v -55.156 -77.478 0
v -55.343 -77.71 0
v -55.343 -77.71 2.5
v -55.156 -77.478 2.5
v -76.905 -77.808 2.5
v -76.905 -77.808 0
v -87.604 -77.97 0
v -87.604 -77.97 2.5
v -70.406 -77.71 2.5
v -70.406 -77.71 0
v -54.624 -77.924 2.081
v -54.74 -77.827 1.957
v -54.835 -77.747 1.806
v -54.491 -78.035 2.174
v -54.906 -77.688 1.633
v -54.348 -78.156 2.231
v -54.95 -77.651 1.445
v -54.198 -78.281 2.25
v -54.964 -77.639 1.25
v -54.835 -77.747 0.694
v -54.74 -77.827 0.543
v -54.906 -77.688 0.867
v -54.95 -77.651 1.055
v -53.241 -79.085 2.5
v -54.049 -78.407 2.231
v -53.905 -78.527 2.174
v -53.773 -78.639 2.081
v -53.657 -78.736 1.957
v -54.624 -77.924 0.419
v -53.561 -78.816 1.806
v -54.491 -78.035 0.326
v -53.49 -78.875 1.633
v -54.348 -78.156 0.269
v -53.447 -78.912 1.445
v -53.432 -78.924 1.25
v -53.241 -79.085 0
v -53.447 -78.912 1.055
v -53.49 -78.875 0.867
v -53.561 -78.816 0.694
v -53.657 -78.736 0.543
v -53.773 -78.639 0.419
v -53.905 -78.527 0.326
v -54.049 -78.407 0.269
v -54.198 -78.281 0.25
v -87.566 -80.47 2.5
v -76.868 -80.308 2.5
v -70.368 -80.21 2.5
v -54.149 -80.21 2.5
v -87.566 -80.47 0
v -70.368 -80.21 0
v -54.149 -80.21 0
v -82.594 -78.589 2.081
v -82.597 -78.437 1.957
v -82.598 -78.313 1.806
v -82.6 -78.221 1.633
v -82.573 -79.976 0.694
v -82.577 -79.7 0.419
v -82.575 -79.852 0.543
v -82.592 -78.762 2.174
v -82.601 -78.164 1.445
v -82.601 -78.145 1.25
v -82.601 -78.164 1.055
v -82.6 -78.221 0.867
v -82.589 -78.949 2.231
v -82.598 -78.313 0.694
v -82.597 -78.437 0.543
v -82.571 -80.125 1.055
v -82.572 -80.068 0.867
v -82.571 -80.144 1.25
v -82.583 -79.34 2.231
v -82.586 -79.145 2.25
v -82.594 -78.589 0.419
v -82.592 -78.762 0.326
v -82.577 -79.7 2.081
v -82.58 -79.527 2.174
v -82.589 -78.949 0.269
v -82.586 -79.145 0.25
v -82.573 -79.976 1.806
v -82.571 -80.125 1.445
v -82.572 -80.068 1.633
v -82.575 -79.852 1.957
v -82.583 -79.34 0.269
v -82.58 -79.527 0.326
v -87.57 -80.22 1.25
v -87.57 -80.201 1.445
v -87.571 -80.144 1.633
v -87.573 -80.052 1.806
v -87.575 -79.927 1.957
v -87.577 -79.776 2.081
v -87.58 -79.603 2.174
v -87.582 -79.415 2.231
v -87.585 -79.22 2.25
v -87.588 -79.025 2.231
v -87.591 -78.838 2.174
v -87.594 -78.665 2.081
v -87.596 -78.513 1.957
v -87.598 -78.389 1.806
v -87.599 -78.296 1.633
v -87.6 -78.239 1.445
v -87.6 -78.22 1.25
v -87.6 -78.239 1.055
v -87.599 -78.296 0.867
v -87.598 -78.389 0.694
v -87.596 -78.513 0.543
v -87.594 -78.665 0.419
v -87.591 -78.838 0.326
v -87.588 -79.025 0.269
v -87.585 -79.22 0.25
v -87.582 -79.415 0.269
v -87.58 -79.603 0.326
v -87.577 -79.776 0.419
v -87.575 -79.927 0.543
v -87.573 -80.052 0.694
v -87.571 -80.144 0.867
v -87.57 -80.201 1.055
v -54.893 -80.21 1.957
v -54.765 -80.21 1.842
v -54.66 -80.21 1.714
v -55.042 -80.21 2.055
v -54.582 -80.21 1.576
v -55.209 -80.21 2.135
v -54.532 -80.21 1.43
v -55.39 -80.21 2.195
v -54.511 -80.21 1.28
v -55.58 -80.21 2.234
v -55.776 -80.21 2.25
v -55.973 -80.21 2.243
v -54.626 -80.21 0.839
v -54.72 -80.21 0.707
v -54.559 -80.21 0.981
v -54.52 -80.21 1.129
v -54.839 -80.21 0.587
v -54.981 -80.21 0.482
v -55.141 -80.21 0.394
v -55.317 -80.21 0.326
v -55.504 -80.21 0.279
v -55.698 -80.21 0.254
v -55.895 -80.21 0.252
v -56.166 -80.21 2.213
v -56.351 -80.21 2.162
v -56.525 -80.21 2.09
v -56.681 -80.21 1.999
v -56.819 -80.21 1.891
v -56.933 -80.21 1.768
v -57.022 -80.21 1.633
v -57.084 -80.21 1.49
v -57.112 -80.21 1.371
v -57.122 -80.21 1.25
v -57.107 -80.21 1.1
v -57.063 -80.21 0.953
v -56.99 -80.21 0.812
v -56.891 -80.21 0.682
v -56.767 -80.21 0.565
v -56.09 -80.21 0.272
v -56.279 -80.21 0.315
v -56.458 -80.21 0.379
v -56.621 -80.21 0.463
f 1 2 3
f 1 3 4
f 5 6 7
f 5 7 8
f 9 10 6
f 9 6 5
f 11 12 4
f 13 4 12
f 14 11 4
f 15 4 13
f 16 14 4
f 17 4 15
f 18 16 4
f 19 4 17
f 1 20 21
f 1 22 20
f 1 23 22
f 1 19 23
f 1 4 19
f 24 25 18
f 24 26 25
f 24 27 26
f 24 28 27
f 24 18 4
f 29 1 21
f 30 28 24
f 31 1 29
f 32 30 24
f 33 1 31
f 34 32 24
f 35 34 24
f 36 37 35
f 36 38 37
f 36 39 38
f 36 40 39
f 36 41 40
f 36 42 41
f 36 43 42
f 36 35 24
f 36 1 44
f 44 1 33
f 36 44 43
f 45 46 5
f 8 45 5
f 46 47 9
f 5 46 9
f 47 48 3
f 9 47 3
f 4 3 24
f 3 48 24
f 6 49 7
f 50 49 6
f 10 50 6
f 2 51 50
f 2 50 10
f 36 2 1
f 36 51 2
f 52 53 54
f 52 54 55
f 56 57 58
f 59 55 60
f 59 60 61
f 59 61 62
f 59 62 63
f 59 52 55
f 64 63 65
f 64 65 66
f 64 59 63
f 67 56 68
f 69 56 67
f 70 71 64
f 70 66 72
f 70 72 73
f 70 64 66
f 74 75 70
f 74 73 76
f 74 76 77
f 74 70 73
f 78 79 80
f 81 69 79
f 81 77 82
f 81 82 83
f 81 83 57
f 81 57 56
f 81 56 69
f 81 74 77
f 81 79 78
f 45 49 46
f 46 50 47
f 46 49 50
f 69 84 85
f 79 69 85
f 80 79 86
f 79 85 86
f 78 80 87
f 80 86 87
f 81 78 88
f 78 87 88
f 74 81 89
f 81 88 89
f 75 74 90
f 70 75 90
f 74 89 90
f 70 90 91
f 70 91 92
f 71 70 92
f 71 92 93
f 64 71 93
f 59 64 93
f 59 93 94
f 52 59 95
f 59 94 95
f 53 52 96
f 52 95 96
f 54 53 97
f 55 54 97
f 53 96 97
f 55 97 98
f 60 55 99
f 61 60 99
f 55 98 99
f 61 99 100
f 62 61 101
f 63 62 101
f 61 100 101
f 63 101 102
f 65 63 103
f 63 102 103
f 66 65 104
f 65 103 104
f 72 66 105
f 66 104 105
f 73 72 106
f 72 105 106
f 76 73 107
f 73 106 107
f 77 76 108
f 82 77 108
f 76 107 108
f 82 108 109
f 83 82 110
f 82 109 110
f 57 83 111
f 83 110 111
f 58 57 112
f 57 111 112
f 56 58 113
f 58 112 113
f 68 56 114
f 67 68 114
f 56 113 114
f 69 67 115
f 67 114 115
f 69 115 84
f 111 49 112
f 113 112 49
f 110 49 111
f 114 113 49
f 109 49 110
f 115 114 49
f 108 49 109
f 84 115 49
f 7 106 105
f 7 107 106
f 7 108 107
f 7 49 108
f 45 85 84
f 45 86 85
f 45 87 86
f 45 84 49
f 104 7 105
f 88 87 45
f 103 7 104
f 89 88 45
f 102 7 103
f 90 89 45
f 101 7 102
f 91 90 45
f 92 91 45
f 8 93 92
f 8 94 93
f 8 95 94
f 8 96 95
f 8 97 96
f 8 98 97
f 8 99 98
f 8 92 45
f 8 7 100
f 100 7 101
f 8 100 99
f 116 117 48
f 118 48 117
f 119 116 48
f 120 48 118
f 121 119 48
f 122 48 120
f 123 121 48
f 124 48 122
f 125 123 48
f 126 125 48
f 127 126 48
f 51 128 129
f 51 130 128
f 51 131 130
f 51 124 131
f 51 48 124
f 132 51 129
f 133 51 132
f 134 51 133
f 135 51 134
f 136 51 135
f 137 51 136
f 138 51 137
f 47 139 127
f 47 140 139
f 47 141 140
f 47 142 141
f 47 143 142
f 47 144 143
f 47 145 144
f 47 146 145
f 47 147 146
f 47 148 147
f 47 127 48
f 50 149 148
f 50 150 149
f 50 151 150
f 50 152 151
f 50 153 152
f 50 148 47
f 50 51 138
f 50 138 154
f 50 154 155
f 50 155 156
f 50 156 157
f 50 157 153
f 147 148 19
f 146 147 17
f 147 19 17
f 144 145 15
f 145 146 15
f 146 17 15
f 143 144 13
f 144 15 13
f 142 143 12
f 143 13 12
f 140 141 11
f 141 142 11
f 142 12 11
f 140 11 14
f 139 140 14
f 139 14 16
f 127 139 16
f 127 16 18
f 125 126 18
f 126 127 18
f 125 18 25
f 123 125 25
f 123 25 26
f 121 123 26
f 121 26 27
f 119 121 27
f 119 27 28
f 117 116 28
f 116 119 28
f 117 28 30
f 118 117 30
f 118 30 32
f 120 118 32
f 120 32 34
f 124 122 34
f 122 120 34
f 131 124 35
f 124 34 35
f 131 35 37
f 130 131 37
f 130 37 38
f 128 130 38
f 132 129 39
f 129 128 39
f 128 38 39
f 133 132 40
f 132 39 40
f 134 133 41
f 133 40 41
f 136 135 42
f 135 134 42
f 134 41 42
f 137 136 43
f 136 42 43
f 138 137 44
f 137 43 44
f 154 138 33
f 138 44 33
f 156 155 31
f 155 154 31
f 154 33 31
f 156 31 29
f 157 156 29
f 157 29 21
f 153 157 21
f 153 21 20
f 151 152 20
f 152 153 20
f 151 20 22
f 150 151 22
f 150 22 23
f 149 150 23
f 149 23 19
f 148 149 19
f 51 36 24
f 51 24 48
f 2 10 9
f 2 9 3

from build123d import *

# Parameters (mm, degrees)
BOSS_EXTRUDE1_DEPTH = 2.5
SKETCH2_R           = 1
CUT_EXTRUDE1_DEPTH  = 4.5
SKETCH3_R           = 1
CUT_EXTRUDE2_DEPTH  = 9.5
SKETCH5_R           = 1
BOSS_EXTRUDE2_DEPTH = 9.5
SKETCH7_W           = 2.5
SKETCH7_H           = 2.48697386
BOSS_EXTRUDE5_DEPTH = 17
SKETCH8_R           = 1
CUT_EXTRUDE3_DEPTH  = 9.5
SKETCH9_W           = 2.5
SKETCH9_H           = 2.510853282
CUT_EXTRUDE4_DEPTH  = 10.5
SKETCH10_R          = 1
CUT_EXTRUDE5_DEPTH  = 4.5
SKETCH11_R          = 1
BOSS_EXTRUDE6_DEPTH = 4.5
SKETCH12_R          = 1
CUT_EXTRUDE6_DEPTH  = 4
SKETCH13_W          = 2.5
SKETCH13_H          = 2.5
CUT_EXTRUDE7_DEPTH  = 6.5
SKETCH14_W          = 2.5
SKETCH14_H          = 2.5
BOSS_EXTRUDE7_DEPTH = 6.5
SKETCH15_R          = 1
CUT_EXTRUDE8_DEPTH  = 5
SKETCH16_R          = 1
BOSS_EXTRUDE8_DEPTH = 5
SKETCH17_W          = 2.5
SKETCH17_H          = 2.5
BOSS_EXTRUDE9_DEPTH = 17
SKETCH18_R          = 1
CUT_EXTRUDE9_DEPTH  = 5
SKETCH19_W          = 2.5
SKETCH19_H          = 2.5
CUT_EXTRUDE10_DEPTH = 6.3
SKETCH20_R          = 1
CUT_EXTRUDE11_DEPTH = 5


with BuildPart() as part:
    # Sketch1 → Boss-Extrude1 (new body)
    with BuildSketch(Plane.XY):
        Polygon((-70.406172668, -77.710060133), (-55.343173361, -77.710060133), (-55.155758053, -77.477979804), (-53.240646945, -79.084948828), (-54.148993857, -80.209773972), (-70.368347793, -80.209773972), align=None)
    extrude(amount=BOSS_EXTRUDE1_DEPTH)

    # Sketch2 → Cut-Extrude1 (cut)
    with BuildSketch(Plane(origin=(-60.939488189, -72.62485398, 0), x_dir=(0, 0, -1), z_dir=(0.6427876096865354, 0.7660444431189815, 0))):
        with Locations(Location((-1.25, -8.800123479, 0), (0, 0, 90))):
            Circle(SKETCH2_R)
    extrude(amount=-CUT_EXTRUDE1_DEPTH, mode=Mode.SUBTRACT)

    # Sketch3 → Cut-Extrude2 (cut)
    with BuildSketch(Plane(origin=(-71.565670343, -1.082908957, 0), x_dir=(0, 0, 1), z_dir=(-0.9998855357578962, -0.015129949839474955, 0))):
        with Locations(Location((1.25, -77.885923249, 0), (0, 0, 270))):
            Circle(SKETCH3_R)
    extrude(amount=-CUT_EXTRUDE2_DEPTH, mode=Mode.SUBTRACT)

    # Sketch5 → Boss-Extrude2 (add)
    with BuildSketch(Plane(origin=(-71.565670343, -1.082908957, 0), x_dir=(0, 0, 1), z_dir=(-0.9998855357578961, -0.015129949839476386, 0))):
        with Locations((1.25, -77.885923249)):
            Circle(SKETCH5_R)
    extrude(amount=-BOSS_EXTRUDE2_DEPTH)

    # Sketch7 → Boss-Extrude5 (add)
    with BuildSketch(Plane(origin=(-71.565670343, -1.082908957, 0), x_dir=(0, 0, 1), z_dir=(-0.9998855357578961, -0.015129949839476386, 0))):
        with Locations((1.25, -77.879410179)):
            Rectangle(SKETCH7_W, SKETCH7_H)
    extrude(amount=BOSS_EXTRUDE5_DEPTH)

    # Sketch8 → Cut-Extrude3 (cut)
    with BuildSketch(Plane(origin=(-88.56372445, -1.340118104, 0), x_dir=(0, 0, 1), z_dir=(-0.9998855357578962, -0.015129949839480206, 0))):
        with Locations(Location((1.25, -77.885923249, 0), (0, 0, 270))):
            Circle(SKETCH8_R)
    extrude(amount=-CUT_EXTRUDE3_DEPTH, mode=Mode.SUBTRACT)

    # Sketch9 → Cut-Extrude4 (cut)
    with BuildSketch(Plane(origin=(-88.56372445, -1.340118104, 0), x_dir=(0, 0, 1), z_dir=(-0.9998855357578962, -0.015129949839480206, 0))):
        with Locations((1.25, -77.89134989)):
            Rectangle(SKETCH9_W, SKETCH9_H)
    extrude(amount=-CUT_EXTRUDE4_DEPTH, mode=Mode.SUBTRACT)

    # Sketch10 → Cut-Extrude5 (cut)
    with BuildSketch(Plane(origin=(-78.064926325, -1.181253631, 0), x_dir=(0, 0, 1), z_dir=(-0.9998855357578961, -0.015129949839478678, 0))):
        with Locations(Location((1.25, -77.885923249, 0), (0, 0, 270))):
            Circle(SKETCH10_R)
    extrude(amount=-CUT_EXTRUDE5_DEPTH, mode=Mode.SUBTRACT)

    # Sketch11 → Boss-Extrude6 (add)
    with BuildSketch(Plane(origin=(-78.064926325, -1.181253631, 0), x_dir=(0, 0, 1), z_dir=(-0.9998855357578961, -0.015129949839478678, 0))):
        with Locations((1.25, -77.885923249)):
            Circle(SKETCH11_R)
    extrude(amount=-BOSS_EXTRUDE6_DEPTH)

    # Sketch12 → Cut-Extrude6 (cut)
    with BuildSketch(Plane(origin=(-78.064926325, -1.181253631, 0), x_dir=(0, 0, 1), z_dir=(-0.9998855357578961, -0.015129949839478678, 0))):
        with Locations(Location((1.25, -77.885923249, 0), (0, 0, 270))):
            Circle(SKETCH12_R)
    extrude(amount=-CUT_EXTRUDE6_DEPTH, mode=Mode.SUBTRACT)

    # Sketch13 → Cut-Extrude7 (cut)
    with BuildSketch(Plane(origin=(-78.064926325, -1.181253631, 0), x_dir=(0, 0, 1), z_dir=(-0.9998855357578961, -0.015129949839478678, 0))):
        with Locations((1.25, -77.885923249)):
            Rectangle(SKETCH13_W, SKETCH13_H)
    extrude(amount=-CUT_EXTRUDE7_DEPTH, mode=Mode.SUBTRACT)

    # Sketch14 → Boss-Extrude7 (add)
    with BuildSketch(Plane(origin=(-71.565670343, -1.082908957, 0), x_dir=(0, 0, 1), z_dir=(-0.9998855357578961, -0.015129949839476386, 0))):
        with Locations((1.25, -77.885923249)):
            Rectangle(SKETCH14_W, SKETCH14_H)
    extrude(amount=BOSS_EXTRUDE7_DEPTH)

    # Sketch15 → Cut-Extrude8 (cut)
    with BuildSketch(Plane(origin=(-78.064926325, -1.181253631, 0), x_dir=(0, 0, 1), z_dir=(-0.9998855357578961, -0.01512994983947622, 0))):
        with Locations(Location((1.25, -77.885923249, 0), (0, 0, 270))):
            Circle(SKETCH15_R)
    extrude(amount=-CUT_EXTRUDE8_DEPTH, mode=Mode.SUBTRACT)

    # Sketch16 → Boss-Extrude8 (add)
    with BuildSketch(Plane(origin=(-78.064926325, -1.181253631, 0), x_dir=(0, 0, 1), z_dir=(-0.9998855357578961, -0.01512994983947622, 0))):
        with Locations((1.25, -77.885923249)):
            Circle(SKETCH16_R)
    extrude(amount=-BOSS_EXTRUDE8_DEPTH)

    # Sketch17 → Boss-Extrude9 (add)
    with BuildSketch(Plane(origin=(-78.064926325, -1.181253631, 0), x_dir=(0, 0, 1), z_dir=(-0.9998855357578961, -0.01512994983947622, 0))):
        with Locations((1.25, -77.885923249)):
            Rectangle(SKETCH17_W, SKETCH17_H)
    extrude(amount=BOSS_EXTRUDE9_DEPTH)

    # Sketch18 → Cut-Extrude9 (cut)
    with BuildSketch(Plane(origin=(-95.062980433, -1.438462778, 0), x_dir=(0, 0, 1), z_dir=(-0.9998855357578961, -0.01512994983947622, 0))):
        with Locations(Location((1.25, -77.885923249, 0), (0, 0, 270))):
            Circle(SKETCH18_R)
    extrude(amount=-CUT_EXTRUDE9_DEPTH, mode=Mode.SUBTRACT)

    # Sketch19 → Cut-Extrude10 (cut)
    with BuildSketch(Plane(origin=(-95.062980433, -1.438462778, 0), x_dir=(0, 0, 1), z_dir=(-0.9998855357578961, -0.01512994983947622, 0))):
        with Locations((1.25, -77.885923249)):
            Rectangle(SKETCH19_W, SKETCH19_H)
    extrude(amount=-CUT_EXTRUDE10_DEPTH, mode=Mode.SUBTRACT)

    # Sketch20 → Cut-Extrude11 (cut)
    with BuildSketch(Plane(origin=(-88.763701558, -1.343144094, 0), x_dir=(0, 0, 1), z_dir=(-0.9998855357578961, -0.015129949839476473, 0))):
        with Locations(Location((1.25, -77.885923249, 0), (0, 0, 270))):
            Circle(SKETCH20_R)
    extrude(amount=-CUT_EXTRUDE11_DEPTH, mode=Mode.SUBTRACT)


solid = part.part
